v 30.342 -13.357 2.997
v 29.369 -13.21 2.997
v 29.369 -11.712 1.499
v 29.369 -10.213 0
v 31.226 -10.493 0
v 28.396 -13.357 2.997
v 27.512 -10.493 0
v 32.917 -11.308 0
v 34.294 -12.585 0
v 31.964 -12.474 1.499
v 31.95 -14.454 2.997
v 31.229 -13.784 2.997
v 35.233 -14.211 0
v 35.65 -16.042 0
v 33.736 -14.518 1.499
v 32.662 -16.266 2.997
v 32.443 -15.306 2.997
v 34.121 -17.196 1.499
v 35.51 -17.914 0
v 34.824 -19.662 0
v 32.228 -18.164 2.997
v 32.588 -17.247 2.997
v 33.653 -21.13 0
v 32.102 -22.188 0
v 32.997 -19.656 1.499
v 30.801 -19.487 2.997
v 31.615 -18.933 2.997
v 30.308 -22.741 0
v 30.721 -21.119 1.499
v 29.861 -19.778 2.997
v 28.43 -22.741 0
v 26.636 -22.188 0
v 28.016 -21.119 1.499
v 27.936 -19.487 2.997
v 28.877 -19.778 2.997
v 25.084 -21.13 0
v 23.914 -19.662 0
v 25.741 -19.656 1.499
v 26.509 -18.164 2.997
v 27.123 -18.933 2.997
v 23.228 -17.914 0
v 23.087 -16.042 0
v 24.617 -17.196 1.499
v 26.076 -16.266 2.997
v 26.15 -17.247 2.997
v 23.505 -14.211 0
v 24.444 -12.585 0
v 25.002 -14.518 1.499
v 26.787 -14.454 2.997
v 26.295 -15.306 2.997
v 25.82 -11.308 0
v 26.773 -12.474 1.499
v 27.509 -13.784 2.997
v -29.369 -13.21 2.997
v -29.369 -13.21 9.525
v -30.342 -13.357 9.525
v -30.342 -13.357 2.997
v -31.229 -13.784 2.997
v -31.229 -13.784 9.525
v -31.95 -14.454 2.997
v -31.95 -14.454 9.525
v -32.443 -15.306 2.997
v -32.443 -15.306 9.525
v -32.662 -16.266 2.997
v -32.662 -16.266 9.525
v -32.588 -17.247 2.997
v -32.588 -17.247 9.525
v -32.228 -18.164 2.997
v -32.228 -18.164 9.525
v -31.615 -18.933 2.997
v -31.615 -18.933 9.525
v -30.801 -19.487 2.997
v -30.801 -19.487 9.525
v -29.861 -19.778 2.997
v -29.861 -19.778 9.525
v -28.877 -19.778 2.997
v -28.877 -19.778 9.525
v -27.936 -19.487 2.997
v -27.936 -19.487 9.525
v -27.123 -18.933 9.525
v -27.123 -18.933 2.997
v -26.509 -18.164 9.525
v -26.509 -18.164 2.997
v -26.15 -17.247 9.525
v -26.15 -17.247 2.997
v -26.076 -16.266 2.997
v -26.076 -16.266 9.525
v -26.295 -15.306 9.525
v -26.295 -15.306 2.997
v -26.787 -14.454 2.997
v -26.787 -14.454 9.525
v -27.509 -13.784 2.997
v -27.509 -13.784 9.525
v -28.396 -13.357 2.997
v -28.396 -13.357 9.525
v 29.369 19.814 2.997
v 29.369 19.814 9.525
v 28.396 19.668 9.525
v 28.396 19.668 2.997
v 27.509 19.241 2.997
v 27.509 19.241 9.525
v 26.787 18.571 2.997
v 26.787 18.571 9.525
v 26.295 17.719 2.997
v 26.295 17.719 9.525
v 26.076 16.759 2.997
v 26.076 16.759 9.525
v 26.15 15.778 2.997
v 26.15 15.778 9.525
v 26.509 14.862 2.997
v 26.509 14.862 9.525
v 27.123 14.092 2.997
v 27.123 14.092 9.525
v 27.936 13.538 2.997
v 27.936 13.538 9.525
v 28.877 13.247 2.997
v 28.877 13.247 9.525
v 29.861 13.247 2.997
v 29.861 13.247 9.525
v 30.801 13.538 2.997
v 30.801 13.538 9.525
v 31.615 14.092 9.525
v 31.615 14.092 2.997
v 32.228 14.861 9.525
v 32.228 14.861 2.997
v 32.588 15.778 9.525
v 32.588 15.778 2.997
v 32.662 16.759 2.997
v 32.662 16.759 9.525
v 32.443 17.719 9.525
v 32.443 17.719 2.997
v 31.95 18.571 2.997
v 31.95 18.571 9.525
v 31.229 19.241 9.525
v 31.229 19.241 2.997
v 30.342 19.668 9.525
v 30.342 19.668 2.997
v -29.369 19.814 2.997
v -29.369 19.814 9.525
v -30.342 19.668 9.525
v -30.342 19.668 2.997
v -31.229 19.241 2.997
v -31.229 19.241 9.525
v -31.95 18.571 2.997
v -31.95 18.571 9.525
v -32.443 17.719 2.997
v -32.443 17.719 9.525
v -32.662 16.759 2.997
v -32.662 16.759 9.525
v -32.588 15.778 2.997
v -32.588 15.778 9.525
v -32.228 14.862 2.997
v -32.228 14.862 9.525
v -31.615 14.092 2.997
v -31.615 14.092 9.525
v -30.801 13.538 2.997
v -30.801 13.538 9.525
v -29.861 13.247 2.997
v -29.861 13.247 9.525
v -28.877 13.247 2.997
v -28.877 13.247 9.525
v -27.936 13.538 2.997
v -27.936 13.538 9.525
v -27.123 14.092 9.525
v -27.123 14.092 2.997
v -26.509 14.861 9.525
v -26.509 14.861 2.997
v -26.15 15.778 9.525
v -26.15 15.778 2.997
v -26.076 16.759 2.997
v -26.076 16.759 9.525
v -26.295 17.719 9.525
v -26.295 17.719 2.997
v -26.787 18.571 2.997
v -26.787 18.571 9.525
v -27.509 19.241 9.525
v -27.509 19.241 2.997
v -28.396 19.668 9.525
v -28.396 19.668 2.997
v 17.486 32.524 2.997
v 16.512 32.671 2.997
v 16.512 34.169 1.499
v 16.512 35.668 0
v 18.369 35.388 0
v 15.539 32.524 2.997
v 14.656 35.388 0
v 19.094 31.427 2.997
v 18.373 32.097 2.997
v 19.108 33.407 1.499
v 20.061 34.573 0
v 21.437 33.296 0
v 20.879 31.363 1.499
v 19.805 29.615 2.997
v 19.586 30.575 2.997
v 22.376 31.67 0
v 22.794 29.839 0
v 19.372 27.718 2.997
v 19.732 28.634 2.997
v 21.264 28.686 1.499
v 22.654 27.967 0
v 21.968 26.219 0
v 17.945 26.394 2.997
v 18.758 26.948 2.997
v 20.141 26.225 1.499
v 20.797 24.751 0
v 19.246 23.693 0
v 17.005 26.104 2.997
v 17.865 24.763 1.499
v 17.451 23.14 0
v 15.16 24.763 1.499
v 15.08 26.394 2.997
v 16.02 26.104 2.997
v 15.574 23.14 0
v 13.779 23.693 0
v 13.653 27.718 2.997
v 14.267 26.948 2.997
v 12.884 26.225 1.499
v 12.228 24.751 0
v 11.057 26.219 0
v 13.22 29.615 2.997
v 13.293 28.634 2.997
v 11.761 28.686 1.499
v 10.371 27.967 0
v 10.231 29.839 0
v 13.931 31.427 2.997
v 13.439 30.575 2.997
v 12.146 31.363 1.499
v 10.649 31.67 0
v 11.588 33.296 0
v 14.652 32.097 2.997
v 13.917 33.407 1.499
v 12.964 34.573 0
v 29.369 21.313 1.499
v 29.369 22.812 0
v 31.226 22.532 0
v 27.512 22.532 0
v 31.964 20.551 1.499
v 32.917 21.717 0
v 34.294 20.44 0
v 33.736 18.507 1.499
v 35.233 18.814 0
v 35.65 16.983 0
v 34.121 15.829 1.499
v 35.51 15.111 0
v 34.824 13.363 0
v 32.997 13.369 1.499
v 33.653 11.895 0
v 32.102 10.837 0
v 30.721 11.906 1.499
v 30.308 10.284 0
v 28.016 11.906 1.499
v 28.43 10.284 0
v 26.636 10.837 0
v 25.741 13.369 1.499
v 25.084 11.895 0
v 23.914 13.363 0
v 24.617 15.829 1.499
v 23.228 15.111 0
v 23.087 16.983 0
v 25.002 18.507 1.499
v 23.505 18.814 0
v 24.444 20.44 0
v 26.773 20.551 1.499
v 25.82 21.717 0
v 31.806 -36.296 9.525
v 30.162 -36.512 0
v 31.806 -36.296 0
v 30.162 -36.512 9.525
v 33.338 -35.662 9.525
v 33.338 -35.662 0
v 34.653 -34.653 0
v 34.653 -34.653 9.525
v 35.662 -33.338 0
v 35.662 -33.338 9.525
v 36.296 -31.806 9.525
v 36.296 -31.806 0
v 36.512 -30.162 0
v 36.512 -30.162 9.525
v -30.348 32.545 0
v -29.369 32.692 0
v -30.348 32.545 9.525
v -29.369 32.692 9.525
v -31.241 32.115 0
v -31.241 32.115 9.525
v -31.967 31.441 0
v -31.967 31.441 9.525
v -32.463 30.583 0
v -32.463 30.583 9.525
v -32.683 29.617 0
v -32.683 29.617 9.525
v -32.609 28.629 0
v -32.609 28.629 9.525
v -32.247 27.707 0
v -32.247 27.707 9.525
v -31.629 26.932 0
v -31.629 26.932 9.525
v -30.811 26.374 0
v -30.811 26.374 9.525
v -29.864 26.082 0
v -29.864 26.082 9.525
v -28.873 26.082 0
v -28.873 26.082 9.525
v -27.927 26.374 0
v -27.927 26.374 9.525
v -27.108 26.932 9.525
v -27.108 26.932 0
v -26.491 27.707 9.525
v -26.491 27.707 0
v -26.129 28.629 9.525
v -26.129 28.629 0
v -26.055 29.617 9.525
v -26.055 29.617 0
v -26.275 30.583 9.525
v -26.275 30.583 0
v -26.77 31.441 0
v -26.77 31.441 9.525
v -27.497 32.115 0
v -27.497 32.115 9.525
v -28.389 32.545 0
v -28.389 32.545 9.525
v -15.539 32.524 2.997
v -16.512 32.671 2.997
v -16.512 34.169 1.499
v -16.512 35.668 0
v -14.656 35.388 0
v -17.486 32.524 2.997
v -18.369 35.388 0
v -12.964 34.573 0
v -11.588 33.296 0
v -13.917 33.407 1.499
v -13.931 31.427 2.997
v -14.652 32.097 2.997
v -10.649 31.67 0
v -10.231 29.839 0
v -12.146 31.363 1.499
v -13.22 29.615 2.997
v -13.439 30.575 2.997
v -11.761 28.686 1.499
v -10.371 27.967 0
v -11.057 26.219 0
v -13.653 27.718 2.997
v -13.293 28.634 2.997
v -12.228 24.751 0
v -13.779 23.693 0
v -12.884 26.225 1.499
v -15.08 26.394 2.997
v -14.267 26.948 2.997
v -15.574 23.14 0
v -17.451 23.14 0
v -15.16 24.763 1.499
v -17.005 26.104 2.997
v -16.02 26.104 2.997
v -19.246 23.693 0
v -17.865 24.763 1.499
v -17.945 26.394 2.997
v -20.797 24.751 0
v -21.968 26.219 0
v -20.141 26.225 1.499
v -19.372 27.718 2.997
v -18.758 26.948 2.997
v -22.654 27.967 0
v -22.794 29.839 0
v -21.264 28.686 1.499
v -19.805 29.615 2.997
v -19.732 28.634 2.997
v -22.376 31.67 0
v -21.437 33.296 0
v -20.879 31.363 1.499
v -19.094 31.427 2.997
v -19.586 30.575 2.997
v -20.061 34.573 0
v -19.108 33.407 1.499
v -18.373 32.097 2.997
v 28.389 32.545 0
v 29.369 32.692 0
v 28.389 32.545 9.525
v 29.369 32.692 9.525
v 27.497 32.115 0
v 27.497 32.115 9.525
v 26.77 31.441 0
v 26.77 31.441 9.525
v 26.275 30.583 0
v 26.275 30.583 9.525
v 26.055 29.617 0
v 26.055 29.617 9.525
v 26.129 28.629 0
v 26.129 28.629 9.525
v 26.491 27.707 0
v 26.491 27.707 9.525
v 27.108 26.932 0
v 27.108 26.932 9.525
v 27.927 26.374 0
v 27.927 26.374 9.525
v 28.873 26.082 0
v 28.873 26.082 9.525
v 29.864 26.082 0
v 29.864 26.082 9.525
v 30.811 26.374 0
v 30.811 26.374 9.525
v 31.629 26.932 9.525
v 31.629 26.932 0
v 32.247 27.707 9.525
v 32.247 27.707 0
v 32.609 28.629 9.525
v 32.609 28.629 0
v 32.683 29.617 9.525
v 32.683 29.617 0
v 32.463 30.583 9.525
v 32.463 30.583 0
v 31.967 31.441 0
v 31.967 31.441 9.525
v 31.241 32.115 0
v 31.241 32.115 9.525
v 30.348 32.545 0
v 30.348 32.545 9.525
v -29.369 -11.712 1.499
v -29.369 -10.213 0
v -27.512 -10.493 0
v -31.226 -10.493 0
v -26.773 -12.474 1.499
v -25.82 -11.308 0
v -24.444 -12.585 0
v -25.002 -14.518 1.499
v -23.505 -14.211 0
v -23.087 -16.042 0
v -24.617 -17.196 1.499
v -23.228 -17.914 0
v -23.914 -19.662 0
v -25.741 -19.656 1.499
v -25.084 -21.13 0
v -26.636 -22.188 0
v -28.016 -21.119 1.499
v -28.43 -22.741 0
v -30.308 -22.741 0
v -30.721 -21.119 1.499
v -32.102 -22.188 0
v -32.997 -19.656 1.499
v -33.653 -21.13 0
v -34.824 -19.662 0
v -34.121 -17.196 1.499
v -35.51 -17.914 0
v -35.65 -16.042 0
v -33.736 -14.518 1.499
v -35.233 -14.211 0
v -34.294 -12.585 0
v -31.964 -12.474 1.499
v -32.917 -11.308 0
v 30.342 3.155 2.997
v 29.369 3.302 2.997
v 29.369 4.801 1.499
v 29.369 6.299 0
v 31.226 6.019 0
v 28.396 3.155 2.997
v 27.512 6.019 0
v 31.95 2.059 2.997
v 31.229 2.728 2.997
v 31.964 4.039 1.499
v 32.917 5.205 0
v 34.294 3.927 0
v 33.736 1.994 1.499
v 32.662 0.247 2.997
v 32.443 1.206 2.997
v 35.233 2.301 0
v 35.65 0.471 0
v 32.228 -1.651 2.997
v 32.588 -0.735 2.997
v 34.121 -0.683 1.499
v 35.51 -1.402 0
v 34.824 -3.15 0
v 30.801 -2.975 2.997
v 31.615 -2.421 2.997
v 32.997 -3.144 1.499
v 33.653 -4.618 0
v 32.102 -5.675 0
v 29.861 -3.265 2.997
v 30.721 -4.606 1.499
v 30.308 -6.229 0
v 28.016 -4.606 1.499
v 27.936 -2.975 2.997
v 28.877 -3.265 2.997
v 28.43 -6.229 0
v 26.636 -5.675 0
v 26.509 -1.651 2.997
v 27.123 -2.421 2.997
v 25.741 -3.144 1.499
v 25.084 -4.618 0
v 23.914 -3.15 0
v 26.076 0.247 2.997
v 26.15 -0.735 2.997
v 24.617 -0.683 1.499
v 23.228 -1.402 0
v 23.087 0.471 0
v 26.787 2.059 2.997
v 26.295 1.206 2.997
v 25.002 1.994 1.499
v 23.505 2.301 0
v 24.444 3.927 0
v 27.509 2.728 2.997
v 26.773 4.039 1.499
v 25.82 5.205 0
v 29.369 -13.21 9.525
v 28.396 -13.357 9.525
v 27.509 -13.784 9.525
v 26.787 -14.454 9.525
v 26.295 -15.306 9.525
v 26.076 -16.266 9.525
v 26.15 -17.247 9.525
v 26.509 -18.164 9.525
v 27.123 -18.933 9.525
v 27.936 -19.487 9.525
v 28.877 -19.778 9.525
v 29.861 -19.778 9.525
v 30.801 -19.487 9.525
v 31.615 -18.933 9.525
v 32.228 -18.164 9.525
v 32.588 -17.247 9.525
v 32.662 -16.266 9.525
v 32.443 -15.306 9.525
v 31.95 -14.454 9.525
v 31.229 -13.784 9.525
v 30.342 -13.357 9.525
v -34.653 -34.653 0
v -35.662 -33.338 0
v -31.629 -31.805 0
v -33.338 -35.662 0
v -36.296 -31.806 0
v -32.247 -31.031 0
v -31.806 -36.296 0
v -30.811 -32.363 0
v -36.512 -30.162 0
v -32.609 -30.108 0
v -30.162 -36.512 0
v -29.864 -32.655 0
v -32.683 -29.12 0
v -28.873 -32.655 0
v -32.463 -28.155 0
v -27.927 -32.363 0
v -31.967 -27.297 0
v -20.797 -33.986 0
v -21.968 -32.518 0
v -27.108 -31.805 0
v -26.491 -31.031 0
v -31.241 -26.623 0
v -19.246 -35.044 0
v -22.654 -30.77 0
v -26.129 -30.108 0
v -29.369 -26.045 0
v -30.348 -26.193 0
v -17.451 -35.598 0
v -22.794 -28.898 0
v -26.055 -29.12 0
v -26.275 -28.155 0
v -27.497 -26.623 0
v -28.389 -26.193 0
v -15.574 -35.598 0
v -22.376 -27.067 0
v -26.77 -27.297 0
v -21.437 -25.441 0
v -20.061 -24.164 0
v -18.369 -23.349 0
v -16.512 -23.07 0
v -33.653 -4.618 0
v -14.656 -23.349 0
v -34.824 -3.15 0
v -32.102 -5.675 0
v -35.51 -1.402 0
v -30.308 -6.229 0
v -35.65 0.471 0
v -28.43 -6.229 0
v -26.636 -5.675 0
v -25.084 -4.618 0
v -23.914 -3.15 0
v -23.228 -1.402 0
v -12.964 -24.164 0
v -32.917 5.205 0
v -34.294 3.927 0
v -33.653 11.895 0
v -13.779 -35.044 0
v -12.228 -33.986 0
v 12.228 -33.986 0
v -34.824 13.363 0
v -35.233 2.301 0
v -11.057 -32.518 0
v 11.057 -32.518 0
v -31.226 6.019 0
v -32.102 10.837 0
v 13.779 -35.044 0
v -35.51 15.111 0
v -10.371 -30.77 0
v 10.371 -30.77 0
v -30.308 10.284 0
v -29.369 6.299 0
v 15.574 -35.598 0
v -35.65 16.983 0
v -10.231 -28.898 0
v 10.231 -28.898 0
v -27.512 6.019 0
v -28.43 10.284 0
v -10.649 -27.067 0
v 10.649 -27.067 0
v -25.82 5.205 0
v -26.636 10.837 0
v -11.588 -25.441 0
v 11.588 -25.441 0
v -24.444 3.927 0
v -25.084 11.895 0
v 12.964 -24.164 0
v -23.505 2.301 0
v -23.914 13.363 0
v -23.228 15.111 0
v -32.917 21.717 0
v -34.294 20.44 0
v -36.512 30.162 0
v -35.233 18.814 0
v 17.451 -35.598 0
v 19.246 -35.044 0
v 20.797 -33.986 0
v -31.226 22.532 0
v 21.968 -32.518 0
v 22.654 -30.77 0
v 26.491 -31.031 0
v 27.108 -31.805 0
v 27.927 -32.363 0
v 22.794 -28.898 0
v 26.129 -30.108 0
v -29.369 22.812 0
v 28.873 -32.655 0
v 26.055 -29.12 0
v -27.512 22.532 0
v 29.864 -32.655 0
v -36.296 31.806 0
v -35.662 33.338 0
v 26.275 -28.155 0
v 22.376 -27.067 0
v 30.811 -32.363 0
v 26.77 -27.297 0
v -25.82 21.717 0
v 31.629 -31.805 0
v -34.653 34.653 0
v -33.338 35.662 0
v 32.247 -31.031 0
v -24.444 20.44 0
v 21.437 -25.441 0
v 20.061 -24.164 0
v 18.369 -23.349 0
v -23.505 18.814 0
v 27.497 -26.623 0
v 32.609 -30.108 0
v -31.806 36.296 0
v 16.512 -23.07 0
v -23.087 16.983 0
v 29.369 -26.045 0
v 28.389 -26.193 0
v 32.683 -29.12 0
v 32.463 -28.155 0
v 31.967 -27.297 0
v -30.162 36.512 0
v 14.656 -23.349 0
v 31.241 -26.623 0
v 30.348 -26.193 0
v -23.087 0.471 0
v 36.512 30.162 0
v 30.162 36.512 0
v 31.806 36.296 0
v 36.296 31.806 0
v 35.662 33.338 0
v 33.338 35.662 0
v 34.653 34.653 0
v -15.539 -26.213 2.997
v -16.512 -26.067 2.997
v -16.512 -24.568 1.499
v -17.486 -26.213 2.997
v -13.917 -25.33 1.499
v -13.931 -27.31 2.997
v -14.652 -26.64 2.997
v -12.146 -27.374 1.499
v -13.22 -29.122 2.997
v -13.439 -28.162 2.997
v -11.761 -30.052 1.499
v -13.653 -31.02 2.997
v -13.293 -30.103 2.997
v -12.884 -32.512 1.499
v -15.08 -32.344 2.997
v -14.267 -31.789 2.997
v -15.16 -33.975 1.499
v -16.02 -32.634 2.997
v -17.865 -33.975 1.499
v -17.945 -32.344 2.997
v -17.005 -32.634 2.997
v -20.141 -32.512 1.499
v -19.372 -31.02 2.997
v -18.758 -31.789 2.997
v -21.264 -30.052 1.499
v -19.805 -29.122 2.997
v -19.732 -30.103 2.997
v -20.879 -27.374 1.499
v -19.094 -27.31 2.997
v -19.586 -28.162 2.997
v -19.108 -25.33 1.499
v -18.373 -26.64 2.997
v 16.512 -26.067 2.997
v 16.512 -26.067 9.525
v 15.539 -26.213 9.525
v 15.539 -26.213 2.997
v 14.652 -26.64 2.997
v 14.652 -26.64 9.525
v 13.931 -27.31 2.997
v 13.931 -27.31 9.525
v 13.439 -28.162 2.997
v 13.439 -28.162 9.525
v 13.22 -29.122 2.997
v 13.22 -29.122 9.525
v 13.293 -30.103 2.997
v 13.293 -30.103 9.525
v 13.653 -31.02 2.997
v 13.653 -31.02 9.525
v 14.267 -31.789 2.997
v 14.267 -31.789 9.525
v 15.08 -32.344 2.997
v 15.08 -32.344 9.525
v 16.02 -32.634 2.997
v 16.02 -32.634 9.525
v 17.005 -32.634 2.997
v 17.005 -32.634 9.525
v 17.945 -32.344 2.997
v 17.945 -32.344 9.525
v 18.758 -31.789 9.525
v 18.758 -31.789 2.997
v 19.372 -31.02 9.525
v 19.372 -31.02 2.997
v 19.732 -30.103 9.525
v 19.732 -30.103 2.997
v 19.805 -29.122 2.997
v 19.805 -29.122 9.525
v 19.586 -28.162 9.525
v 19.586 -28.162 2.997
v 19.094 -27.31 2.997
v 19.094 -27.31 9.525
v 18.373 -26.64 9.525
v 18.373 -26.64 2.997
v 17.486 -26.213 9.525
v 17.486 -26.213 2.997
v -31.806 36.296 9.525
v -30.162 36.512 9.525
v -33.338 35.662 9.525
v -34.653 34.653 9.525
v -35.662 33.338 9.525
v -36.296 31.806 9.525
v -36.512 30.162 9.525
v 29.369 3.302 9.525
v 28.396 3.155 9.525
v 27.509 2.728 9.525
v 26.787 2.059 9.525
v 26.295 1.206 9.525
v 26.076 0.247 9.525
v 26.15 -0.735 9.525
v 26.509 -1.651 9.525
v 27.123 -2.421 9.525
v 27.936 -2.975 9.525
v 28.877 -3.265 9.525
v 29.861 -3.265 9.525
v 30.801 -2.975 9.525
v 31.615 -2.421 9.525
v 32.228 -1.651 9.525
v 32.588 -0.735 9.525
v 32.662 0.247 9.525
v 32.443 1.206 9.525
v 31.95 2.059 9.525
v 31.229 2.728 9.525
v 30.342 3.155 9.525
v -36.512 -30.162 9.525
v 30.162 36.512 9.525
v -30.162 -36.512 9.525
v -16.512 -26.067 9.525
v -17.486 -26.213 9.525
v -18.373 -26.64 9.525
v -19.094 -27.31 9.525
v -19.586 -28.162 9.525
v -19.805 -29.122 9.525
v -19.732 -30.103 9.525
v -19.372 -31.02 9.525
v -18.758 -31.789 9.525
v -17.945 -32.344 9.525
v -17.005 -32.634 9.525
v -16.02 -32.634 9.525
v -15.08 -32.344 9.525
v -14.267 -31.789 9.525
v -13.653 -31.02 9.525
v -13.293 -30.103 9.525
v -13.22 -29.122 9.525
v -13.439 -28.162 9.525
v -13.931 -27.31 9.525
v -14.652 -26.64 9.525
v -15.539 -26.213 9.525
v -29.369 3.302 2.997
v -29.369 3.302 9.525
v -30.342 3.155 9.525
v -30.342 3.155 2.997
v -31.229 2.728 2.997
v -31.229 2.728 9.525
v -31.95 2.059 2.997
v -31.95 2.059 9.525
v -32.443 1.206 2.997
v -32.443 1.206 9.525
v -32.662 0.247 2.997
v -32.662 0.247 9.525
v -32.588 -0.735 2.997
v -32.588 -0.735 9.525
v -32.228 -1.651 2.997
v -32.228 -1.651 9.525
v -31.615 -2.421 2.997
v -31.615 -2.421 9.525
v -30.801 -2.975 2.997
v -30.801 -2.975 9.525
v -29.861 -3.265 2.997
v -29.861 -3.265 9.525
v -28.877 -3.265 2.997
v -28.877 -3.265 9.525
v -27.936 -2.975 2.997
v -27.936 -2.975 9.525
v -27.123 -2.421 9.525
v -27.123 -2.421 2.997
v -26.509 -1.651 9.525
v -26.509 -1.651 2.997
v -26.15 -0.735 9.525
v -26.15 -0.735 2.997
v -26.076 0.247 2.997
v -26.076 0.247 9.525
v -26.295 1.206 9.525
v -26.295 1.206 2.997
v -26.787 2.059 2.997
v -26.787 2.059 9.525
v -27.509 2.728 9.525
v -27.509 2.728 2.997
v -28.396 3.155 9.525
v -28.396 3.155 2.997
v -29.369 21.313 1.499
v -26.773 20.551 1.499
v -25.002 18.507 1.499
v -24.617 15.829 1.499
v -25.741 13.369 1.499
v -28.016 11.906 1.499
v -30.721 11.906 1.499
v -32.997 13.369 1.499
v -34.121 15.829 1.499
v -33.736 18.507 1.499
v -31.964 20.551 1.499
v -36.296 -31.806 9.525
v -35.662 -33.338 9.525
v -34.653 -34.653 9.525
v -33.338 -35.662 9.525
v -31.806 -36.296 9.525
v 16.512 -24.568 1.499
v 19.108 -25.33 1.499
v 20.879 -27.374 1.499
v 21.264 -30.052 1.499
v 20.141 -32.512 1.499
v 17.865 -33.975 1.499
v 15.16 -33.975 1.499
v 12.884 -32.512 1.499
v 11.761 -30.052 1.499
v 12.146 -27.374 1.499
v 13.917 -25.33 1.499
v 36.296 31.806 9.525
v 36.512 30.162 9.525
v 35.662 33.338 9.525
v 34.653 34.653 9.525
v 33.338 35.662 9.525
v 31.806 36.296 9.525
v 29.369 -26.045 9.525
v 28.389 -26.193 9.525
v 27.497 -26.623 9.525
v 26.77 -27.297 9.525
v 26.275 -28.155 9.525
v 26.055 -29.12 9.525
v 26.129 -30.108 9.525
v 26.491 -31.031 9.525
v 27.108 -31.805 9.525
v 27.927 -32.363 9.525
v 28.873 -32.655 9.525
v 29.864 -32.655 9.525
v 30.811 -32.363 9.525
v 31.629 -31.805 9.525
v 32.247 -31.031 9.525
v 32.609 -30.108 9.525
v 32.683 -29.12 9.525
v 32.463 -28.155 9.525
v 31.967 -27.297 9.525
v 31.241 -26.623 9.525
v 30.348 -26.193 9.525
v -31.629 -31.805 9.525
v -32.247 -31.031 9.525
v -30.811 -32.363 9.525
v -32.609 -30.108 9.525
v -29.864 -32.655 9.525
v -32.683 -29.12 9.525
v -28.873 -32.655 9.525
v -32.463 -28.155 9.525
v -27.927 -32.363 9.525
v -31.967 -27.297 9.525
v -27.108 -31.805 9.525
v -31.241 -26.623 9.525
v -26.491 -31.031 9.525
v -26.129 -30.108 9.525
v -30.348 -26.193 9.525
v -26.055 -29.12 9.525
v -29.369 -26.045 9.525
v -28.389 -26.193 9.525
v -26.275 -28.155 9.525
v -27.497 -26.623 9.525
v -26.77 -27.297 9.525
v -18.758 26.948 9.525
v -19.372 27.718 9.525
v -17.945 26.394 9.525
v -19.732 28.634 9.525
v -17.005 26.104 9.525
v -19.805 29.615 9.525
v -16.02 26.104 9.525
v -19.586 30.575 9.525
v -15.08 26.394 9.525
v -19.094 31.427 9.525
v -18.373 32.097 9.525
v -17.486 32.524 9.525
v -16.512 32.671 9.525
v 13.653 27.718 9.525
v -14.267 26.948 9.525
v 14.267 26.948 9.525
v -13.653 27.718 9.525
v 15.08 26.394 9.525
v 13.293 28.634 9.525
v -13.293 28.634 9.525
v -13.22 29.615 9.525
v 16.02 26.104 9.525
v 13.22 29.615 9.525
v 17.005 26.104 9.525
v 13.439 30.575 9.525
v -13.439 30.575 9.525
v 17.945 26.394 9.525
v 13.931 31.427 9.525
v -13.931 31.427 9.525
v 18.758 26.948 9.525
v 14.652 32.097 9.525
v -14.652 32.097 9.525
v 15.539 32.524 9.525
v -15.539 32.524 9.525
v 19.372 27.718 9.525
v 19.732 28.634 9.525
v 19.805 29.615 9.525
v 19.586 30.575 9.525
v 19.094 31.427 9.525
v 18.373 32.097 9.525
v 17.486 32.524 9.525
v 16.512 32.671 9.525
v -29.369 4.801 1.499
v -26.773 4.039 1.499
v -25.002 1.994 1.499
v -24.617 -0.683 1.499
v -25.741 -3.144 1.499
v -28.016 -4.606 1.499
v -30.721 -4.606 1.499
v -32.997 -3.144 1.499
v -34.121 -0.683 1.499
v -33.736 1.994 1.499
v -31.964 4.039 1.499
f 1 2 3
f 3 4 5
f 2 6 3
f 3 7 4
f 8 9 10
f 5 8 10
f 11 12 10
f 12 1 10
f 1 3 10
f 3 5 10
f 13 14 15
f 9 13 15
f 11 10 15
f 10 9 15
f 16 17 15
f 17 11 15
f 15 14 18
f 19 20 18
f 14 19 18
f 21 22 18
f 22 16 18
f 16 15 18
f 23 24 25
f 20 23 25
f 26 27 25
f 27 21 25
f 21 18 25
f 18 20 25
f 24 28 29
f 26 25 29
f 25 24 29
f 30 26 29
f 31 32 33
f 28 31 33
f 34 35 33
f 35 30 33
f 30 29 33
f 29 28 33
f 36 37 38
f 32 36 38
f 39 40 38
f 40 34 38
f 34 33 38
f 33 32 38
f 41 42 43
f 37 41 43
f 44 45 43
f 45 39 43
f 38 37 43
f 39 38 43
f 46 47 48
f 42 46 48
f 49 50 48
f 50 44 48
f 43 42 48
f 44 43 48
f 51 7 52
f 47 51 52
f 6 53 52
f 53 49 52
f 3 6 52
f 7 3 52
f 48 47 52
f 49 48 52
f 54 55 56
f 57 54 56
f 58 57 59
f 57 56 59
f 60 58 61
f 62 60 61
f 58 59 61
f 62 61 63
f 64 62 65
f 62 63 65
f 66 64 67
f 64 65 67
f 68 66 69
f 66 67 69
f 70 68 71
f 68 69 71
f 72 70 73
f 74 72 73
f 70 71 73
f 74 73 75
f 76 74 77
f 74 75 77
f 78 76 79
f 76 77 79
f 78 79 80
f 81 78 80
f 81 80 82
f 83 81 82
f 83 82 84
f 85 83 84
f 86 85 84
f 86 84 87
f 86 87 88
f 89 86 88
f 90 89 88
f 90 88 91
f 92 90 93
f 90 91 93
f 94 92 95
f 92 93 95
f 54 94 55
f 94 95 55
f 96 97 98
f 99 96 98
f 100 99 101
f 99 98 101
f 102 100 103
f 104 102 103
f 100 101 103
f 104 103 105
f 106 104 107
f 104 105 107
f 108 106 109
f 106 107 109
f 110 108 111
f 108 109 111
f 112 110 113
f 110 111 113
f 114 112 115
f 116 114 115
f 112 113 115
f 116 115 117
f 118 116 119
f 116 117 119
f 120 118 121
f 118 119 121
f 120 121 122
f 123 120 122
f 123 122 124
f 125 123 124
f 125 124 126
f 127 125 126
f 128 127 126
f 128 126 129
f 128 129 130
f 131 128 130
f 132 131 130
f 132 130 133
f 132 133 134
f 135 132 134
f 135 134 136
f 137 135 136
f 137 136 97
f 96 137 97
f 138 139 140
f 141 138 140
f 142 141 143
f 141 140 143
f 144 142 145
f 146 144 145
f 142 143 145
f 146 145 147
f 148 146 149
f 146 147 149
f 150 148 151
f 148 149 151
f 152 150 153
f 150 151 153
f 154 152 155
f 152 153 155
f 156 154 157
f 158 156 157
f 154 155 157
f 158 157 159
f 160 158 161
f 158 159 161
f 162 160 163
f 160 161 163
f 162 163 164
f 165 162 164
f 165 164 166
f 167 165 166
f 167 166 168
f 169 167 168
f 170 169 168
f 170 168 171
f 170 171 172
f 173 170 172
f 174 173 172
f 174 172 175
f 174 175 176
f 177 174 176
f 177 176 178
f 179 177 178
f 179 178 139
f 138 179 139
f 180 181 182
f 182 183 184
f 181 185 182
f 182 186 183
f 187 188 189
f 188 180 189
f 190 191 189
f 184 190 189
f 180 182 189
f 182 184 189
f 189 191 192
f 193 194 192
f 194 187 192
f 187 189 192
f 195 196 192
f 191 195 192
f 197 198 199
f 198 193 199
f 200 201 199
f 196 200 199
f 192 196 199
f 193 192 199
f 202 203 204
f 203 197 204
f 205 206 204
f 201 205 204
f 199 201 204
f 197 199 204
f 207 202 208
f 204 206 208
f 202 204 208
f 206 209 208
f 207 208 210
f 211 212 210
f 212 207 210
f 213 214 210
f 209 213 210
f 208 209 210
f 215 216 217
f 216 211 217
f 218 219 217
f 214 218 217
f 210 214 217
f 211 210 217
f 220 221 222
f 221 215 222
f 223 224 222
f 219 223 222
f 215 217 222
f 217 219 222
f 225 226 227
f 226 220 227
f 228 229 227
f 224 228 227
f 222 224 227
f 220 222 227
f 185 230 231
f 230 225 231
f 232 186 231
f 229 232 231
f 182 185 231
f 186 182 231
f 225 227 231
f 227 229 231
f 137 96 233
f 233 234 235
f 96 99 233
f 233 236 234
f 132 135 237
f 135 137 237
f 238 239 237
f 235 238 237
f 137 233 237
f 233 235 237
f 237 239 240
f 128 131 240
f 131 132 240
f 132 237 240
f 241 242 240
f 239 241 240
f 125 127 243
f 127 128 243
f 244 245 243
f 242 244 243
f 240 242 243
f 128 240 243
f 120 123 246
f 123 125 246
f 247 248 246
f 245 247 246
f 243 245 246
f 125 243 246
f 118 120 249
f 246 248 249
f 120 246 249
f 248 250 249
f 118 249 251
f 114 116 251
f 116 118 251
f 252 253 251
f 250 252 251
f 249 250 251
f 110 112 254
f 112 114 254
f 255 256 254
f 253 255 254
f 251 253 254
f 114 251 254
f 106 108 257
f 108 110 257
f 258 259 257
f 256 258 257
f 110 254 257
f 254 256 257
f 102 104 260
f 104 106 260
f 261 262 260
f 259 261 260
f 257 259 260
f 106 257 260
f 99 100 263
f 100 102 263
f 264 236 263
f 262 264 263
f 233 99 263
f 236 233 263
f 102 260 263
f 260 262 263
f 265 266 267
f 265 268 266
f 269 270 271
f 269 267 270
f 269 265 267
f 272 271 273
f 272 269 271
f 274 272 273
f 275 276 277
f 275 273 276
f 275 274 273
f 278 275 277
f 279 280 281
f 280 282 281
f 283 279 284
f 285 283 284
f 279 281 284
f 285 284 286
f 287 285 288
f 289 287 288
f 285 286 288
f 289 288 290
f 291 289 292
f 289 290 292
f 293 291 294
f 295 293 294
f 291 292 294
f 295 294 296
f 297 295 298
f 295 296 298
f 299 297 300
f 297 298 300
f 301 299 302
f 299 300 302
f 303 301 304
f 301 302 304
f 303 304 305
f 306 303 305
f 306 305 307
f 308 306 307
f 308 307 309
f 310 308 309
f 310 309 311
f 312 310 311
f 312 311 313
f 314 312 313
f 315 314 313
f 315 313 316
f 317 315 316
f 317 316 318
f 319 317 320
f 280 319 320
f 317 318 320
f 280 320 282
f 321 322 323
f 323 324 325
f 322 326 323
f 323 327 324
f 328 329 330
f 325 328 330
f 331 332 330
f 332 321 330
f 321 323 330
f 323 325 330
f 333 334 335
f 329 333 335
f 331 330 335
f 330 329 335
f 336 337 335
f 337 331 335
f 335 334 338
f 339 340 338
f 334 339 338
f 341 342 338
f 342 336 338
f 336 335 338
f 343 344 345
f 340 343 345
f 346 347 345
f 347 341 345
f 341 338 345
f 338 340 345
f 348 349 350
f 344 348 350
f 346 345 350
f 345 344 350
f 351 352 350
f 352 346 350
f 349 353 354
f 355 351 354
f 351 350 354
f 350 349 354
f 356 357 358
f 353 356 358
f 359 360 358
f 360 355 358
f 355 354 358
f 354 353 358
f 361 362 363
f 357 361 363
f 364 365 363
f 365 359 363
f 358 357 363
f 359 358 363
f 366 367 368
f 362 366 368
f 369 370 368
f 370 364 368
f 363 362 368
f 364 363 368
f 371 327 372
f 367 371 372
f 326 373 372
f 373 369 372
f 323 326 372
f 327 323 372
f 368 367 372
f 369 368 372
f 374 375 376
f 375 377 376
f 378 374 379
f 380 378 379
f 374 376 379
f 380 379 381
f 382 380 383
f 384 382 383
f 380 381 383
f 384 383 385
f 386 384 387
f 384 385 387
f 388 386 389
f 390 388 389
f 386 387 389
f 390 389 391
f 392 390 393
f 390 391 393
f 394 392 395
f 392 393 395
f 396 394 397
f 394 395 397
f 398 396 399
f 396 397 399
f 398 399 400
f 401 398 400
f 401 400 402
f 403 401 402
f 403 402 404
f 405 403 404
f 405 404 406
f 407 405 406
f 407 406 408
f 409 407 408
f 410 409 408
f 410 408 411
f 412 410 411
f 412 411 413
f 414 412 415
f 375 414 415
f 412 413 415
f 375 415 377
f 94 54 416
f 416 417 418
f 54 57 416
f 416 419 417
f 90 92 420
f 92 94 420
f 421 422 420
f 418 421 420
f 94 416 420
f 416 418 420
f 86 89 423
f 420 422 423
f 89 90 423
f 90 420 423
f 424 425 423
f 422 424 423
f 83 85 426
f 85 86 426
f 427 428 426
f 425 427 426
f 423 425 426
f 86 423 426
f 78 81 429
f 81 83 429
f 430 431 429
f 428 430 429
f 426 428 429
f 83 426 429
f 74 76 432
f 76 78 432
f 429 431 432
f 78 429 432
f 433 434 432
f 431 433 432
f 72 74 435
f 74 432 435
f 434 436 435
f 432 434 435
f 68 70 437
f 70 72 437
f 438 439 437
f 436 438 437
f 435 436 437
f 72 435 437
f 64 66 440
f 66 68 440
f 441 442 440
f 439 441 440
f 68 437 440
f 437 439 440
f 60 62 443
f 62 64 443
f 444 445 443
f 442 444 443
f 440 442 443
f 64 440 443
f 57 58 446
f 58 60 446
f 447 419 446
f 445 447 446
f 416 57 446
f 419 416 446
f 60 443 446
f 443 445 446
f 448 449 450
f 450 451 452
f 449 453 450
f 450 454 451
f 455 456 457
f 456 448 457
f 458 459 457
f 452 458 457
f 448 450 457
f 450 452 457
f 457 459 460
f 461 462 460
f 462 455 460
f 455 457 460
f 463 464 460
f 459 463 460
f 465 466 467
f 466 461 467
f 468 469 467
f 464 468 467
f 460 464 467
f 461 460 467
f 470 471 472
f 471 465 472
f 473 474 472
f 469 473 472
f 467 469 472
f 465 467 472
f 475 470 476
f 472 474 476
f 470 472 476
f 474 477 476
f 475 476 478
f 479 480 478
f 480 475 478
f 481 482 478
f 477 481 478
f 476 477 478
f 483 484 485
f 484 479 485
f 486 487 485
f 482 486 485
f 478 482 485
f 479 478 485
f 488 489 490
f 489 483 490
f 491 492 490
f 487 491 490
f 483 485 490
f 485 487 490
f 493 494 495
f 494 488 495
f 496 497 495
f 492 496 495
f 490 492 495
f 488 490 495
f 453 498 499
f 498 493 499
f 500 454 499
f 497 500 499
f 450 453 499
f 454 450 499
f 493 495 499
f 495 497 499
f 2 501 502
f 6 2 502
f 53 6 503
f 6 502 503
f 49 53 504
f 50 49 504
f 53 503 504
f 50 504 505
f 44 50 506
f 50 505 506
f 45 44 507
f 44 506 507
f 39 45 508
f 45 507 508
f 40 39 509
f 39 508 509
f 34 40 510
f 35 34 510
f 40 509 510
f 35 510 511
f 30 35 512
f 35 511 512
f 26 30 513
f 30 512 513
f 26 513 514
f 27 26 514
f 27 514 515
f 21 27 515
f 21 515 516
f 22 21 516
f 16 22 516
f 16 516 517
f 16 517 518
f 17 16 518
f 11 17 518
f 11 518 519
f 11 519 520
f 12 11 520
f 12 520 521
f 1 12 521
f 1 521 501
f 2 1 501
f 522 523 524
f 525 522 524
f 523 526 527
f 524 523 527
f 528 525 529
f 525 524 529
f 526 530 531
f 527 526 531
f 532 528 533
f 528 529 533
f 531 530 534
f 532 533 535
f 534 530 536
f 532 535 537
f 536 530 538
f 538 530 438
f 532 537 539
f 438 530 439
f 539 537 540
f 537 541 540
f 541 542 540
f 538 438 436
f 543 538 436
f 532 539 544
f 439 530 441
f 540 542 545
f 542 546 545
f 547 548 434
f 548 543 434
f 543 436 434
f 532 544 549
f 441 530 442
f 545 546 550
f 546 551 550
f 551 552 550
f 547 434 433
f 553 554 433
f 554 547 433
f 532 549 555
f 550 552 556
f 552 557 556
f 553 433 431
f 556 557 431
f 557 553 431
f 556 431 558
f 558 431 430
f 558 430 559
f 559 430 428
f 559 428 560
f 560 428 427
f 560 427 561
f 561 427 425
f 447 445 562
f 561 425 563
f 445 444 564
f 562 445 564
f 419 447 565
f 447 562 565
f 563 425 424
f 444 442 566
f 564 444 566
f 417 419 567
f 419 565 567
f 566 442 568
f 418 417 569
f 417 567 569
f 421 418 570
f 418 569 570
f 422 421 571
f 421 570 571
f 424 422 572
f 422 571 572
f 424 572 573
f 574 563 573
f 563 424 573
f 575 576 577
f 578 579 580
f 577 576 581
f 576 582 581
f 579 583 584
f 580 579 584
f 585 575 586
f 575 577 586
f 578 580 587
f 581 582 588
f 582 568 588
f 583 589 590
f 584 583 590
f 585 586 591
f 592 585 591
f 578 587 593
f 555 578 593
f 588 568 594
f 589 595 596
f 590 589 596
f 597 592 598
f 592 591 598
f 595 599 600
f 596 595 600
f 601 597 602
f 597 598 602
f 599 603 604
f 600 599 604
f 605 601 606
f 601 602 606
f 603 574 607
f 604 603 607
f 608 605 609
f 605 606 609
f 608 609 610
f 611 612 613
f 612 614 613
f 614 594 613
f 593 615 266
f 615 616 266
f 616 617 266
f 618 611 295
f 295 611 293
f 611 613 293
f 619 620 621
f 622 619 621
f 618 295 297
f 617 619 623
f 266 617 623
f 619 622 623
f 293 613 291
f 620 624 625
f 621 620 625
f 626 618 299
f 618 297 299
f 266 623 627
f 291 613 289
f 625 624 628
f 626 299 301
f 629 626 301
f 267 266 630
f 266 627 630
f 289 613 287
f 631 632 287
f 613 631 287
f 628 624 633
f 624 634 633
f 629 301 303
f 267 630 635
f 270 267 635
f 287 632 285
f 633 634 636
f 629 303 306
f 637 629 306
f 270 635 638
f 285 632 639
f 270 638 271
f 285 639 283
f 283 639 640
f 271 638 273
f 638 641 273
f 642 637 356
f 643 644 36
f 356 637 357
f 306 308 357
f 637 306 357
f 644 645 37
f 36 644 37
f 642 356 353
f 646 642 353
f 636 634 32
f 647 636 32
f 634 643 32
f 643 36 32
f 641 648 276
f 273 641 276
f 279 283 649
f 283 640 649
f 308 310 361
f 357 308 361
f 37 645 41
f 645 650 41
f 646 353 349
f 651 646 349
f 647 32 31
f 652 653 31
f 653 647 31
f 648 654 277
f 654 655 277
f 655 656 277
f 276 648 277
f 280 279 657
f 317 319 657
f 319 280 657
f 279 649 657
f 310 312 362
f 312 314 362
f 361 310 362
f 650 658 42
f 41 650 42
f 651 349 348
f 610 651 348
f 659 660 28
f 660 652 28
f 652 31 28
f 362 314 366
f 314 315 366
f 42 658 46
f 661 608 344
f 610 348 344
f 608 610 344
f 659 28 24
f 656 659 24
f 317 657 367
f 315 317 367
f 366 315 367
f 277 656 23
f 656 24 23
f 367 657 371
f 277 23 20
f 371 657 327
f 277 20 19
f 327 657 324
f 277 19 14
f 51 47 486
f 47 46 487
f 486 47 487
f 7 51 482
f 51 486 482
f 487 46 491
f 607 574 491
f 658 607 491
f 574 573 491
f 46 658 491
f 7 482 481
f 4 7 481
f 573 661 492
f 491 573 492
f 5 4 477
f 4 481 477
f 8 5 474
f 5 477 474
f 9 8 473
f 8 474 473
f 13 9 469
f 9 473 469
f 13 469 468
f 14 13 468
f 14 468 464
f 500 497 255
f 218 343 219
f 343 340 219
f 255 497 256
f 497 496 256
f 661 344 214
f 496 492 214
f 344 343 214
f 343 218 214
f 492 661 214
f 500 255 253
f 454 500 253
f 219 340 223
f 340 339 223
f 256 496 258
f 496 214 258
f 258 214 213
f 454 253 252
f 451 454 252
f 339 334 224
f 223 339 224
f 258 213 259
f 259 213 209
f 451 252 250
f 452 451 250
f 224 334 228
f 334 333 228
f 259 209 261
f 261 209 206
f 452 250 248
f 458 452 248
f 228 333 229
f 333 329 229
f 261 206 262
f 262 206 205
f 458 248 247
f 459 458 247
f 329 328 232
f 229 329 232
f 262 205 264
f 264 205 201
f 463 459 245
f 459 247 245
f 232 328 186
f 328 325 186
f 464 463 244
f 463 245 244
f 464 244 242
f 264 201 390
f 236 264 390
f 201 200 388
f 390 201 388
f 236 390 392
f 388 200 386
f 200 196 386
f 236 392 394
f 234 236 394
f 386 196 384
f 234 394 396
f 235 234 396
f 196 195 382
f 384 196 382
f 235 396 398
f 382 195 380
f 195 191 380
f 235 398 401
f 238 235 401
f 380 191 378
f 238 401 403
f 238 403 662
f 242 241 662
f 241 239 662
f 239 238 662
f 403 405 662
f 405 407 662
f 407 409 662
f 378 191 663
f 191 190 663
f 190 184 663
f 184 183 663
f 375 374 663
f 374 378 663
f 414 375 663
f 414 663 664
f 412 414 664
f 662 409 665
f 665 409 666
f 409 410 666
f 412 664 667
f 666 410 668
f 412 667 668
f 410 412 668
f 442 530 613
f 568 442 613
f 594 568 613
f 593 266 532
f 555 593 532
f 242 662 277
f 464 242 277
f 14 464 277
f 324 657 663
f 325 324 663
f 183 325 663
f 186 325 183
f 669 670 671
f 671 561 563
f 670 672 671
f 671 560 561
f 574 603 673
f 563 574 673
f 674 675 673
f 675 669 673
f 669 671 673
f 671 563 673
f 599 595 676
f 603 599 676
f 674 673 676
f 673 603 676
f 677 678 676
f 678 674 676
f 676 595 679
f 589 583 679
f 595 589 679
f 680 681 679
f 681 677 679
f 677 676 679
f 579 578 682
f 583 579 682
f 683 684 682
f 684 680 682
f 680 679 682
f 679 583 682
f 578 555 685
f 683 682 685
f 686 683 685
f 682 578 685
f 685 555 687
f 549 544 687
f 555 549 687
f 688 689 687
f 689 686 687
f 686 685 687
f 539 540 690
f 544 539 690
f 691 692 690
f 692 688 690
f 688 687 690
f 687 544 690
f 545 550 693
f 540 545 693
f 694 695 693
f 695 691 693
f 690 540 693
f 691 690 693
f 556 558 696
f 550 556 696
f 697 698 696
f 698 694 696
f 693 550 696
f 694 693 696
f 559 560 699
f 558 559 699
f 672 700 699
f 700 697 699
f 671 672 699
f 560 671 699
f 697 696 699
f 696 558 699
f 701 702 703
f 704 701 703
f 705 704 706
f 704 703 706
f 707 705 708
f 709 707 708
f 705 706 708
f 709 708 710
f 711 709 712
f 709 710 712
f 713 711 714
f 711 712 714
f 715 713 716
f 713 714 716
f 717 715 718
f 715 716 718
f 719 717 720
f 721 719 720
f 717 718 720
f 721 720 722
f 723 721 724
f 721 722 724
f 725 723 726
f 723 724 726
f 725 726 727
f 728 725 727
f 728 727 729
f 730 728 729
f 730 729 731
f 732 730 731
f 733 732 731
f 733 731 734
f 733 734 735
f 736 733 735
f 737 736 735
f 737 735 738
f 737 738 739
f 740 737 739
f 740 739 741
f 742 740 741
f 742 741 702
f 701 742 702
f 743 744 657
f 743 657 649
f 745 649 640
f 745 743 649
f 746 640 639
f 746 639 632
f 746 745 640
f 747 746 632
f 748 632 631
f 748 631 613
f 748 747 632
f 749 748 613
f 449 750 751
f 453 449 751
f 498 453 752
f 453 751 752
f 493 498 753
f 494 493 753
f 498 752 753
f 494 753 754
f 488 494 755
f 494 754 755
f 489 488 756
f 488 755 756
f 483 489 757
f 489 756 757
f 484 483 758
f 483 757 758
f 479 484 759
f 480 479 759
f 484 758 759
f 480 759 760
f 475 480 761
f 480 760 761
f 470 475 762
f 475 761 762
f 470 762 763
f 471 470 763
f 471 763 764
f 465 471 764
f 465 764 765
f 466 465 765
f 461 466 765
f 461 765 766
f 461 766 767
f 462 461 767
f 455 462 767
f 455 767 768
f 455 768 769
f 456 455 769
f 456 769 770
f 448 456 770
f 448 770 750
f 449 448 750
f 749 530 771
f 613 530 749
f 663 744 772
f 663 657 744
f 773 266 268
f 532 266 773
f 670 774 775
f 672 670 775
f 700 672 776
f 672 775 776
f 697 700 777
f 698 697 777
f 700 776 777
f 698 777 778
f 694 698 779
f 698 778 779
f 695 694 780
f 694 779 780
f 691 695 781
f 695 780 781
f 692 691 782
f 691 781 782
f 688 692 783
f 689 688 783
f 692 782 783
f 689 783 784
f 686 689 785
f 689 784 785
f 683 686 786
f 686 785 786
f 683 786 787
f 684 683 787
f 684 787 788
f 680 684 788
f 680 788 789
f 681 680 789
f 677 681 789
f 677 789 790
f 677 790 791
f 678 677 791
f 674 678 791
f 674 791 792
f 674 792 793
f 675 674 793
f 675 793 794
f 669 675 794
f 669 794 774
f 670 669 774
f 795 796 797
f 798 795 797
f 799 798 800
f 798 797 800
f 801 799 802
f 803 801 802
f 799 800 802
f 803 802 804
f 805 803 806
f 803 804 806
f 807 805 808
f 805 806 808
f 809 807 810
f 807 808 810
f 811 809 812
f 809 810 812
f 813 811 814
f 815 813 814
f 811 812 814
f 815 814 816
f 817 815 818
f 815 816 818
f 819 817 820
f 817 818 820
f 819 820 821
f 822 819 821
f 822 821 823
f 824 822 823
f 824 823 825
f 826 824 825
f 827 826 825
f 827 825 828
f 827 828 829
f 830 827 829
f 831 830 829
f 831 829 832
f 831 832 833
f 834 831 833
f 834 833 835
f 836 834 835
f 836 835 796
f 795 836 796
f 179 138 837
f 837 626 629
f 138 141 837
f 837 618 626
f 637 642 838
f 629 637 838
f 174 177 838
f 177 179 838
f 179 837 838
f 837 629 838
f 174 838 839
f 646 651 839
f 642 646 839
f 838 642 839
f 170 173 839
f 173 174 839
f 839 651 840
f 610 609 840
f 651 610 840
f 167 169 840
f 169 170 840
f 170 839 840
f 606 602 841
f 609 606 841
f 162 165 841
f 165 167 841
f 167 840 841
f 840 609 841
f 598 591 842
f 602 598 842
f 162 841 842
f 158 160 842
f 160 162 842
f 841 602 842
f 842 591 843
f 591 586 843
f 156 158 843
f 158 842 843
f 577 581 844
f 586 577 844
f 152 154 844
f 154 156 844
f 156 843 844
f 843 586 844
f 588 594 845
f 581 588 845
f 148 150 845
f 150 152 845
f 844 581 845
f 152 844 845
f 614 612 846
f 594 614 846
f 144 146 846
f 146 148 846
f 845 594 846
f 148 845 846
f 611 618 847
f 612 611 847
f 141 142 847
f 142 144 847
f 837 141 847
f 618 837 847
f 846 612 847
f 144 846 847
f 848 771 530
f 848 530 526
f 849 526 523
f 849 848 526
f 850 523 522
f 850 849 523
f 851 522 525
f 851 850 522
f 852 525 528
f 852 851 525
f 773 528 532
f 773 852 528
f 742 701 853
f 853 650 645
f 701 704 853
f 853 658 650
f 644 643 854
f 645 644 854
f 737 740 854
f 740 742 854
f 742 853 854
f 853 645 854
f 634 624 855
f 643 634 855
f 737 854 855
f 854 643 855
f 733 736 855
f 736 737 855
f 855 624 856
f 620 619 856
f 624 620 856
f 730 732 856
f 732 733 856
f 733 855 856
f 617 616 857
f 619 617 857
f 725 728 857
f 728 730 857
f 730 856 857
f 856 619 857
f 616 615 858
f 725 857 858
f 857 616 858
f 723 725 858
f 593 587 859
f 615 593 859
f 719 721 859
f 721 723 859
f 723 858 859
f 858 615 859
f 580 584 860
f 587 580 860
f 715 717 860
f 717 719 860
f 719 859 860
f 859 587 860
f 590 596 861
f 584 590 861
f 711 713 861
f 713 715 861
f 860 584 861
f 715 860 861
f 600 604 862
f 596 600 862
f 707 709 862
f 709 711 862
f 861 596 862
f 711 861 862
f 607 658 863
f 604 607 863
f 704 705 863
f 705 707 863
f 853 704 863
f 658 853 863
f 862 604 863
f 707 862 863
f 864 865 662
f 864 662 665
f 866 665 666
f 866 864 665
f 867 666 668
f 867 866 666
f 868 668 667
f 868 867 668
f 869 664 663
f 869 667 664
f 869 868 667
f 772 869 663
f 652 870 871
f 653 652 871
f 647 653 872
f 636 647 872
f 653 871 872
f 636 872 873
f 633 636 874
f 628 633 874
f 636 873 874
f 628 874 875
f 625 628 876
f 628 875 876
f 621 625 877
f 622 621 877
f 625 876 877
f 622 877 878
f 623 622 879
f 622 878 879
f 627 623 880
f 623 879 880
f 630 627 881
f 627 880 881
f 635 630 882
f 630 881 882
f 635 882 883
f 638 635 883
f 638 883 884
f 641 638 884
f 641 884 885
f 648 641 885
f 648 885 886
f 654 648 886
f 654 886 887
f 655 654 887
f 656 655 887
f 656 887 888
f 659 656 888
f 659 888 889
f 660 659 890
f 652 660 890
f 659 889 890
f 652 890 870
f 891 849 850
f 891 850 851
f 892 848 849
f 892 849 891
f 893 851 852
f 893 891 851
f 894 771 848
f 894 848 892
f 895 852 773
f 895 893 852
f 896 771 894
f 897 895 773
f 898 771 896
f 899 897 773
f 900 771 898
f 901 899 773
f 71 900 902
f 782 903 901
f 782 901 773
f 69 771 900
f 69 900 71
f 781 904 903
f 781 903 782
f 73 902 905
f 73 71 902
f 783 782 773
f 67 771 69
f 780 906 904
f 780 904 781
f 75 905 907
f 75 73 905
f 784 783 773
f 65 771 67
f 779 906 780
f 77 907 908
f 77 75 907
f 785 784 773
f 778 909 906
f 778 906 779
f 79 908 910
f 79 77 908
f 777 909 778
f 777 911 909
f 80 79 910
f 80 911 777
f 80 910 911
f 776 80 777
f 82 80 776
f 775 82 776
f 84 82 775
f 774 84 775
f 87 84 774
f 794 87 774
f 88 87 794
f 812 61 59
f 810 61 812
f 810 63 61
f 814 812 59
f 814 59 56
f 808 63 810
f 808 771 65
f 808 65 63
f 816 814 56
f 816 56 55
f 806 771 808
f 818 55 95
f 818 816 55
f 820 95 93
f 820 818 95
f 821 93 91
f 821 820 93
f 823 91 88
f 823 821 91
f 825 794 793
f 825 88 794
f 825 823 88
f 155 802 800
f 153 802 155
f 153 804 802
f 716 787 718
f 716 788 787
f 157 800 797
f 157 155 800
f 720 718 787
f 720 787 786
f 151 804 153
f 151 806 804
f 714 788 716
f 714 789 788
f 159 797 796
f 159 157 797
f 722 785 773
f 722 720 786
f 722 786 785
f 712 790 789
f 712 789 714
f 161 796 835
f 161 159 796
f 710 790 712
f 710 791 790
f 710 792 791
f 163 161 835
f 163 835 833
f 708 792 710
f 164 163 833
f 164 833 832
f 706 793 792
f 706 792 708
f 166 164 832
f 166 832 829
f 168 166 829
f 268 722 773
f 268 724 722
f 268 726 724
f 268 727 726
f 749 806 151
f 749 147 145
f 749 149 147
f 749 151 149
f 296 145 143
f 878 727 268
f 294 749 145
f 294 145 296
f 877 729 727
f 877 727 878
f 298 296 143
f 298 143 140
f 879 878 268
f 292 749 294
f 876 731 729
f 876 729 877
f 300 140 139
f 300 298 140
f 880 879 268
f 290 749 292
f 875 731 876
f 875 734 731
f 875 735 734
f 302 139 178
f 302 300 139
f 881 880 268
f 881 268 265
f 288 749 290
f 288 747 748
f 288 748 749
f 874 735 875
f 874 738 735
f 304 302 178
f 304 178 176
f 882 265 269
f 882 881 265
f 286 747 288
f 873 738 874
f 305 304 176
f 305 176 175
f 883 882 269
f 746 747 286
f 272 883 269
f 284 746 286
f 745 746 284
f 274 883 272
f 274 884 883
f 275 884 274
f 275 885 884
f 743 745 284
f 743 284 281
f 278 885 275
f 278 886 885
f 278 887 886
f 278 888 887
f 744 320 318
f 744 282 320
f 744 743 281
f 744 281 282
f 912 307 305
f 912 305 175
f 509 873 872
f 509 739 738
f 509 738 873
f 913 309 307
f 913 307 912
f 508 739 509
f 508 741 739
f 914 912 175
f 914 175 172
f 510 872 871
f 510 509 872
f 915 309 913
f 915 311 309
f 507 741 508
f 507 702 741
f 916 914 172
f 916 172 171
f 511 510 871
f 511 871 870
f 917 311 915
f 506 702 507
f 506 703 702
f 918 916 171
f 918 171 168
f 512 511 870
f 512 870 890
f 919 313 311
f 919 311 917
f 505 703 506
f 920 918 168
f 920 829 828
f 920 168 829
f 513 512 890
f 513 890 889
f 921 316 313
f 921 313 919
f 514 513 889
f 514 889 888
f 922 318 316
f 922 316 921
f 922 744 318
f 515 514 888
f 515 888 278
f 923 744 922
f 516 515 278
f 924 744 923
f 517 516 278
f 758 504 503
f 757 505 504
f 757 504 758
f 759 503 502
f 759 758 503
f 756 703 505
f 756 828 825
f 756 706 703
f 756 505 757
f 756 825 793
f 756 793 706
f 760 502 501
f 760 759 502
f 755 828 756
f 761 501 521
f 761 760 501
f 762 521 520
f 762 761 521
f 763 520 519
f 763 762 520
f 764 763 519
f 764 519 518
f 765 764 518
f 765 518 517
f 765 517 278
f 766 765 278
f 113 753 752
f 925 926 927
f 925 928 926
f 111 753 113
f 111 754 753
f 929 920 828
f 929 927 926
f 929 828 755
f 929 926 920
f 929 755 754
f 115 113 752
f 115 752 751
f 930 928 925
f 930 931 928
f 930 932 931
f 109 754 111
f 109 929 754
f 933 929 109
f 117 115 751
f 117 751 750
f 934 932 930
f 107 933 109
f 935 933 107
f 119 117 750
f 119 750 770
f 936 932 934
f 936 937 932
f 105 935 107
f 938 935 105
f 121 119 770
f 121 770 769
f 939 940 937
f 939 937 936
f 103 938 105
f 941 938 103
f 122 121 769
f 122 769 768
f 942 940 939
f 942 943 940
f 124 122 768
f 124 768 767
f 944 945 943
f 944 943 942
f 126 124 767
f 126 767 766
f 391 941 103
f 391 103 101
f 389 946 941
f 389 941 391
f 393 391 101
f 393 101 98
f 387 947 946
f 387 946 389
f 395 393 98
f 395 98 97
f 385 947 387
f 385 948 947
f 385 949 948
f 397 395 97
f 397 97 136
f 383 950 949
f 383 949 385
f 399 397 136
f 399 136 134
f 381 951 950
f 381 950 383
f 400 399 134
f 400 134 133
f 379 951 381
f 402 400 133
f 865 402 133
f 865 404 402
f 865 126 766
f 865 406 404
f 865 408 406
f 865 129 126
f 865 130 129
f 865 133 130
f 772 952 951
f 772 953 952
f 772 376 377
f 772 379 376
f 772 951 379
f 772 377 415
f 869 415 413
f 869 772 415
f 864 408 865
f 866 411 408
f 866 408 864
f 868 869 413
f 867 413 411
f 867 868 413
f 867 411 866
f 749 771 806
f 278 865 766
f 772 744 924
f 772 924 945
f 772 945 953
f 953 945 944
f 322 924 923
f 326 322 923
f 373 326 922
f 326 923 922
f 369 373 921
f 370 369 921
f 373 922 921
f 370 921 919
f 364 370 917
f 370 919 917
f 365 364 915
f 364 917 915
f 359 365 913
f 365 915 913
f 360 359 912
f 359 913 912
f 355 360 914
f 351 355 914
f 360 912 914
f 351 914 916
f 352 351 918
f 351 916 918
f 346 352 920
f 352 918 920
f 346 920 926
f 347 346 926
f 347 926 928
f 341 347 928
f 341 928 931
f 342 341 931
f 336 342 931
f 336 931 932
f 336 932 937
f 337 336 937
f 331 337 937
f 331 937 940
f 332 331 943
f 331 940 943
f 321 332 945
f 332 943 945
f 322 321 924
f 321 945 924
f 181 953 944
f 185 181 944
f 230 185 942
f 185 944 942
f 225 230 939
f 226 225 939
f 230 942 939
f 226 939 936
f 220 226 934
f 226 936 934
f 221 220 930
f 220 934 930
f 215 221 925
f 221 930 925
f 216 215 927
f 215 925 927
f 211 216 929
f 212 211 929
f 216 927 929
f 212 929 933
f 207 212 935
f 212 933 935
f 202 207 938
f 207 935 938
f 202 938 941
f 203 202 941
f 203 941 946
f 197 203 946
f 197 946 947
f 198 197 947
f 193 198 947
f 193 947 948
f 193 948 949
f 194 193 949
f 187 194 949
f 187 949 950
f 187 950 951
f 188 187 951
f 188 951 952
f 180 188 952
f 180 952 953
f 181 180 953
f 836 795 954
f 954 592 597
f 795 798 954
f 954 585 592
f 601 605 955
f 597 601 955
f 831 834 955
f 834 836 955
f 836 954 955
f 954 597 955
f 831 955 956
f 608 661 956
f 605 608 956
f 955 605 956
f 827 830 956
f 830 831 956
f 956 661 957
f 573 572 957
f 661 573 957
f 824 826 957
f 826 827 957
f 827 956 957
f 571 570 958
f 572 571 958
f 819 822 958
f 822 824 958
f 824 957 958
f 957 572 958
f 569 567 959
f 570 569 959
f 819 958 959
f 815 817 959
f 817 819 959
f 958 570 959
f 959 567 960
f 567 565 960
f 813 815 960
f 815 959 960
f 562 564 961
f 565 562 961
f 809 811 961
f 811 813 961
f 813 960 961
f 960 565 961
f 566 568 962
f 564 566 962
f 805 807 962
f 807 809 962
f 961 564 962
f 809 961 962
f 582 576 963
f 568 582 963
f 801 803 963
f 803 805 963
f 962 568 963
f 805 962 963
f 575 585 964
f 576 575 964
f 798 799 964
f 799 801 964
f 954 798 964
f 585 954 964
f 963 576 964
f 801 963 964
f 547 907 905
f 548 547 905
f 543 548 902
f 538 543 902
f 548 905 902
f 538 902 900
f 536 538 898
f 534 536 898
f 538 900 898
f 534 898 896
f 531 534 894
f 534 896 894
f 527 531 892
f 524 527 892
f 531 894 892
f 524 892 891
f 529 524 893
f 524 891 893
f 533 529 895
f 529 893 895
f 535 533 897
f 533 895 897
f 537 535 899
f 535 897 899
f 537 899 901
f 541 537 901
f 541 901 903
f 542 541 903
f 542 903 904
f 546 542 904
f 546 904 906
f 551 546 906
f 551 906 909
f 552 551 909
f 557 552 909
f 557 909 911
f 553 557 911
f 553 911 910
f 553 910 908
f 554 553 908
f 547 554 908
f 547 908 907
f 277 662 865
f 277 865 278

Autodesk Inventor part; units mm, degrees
ref_plane "YZ Plane" through (0, 0, 0) normal (1, 0, 0) x (0, 1, 0)
ref_plane "XZ Plane" through (0, 0, 0) normal (0, 1, 0) x (-1, 0, 0)
ref_plane "XY Plane" through (0, 0, 0) normal (0, 0, 1) x (1, 0, 0)
sketch "Sketch1" plane through (0, 0, 0) normal (0, 0, 1) x (1, 0, 0)
  line L0 (0, 51.1175) -> (0, -51.1175) projected
  line L1 (-51.1175, 0) -> (51.1175, 0) projected
  line L2 (36.5125, -36.5125) -> (-36.5125, -36.5125)
  line L3 (-36.5125, -36.5125) -> (-36.5125, 36.5125)
  line L4 (-36.5125, 36.5125) -> (36.5125, 36.5125)
  line L5 (36.5125, 36.5125) -> (36.5125, -36.5125)
  line L6 (36.5125, -36.5125) -> (-36.5125, 36.5125) construction
  line L7 (-36.5125, -36.5125) -> (36.5125, 36.5125) construction
  line L8 (29.3688, -29.3688) -> (-29.3688, -29.3688) construction
  line L9 (-29.3688, -29.3688) -> (-29.3688, 29.3687) construction
  line L10 (-29.3688, 29.3687) -> (29.3688, 29.3687) construction
  line L11 (29.3688, 29.3687) -> (29.3688, -29.3688) construction
  line L12 (29.3688, -29.3688) -> (-29.3688, 29.3687) construction
  line L13 (-29.3688, -29.3688) -> (29.3688, 29.3687) construction
  point P0 (0, 0)
  dimension "d0" = 73.025
  dimension "d1" = 58.7375
extrude "Extrusion1" add sketch "Sketch1" along normal blind 9.525
hole "Hole1" at (-29.3688, 29.3687, 0) at (29.3688, 29.3687, 0) at (29.3688, -29.3688, 0) at (-29.3688, -29.3688, 0) direction (0, 0, 1) diameter 6.647 end through all thread size "M8x1.25" class "6H" standard "ANSI Metric M Profile"
sketch "Sketch2" plane through (0, 0, 0) normal (0, 0, -1) x (-1, 0, 0)
  line L0 (-36.5125, 36.5125) -> (36.5125, 36.5125) projected
  line L1 (-29.3688, 29.3687) -> (-29.3688, -29.3688) construction
  line L2 (29.3688, -29.3688) -> (29.3688, 29.3687) construction
  line L3 (29.3688, 29.3687) -> (-29.3688, 29.3687) construction
  line L4 (-29.3688, -29.3688) -> (29.3688, -29.3688) construction
  line L5 (16.5125, -29.3687) -> (-16.5125, -29.3687) construction
  line L6 (-16.5125, -29.3687) -> (-16.5125, 29.3687) construction
  line L7 (-16.5125, 29.3687) -> (16.5125, 29.3687) construction
  line L8 (16.5125, 29.3687) -> (16.5125, -29.3687) construction
  line L9 (16.5125, -29.3687) -> (-16.5125, 29.3687) construction
  line L10 (-16.5125, -29.3687) -> (16.5125, 29.3687) construction
  line L11 (-36.5125, -36.5125) -> (-36.5125, 36.5125) construction
  line L12 (29.3688, -16.5125) -> (-29.3688, -16.5125) construction
  line L13 (-29.3688, -16.5125) -> (-29.3688, 16.5125) construction
  line L14 (-29.3688, 16.5125) -> (29.3688, 16.5125) construction
  line L15 (29.3688, 16.5125) -> (29.3688, -16.5125) construction
  line L16 (29.3688, -16.5125) -> (-29.3688, 16.5125) construction
  line L17 (-29.3688, -16.5125) -> (29.3688, 16.5125) construction
  point P0 (0, 0)
  point P1 (-29.3688, 0)
  point P2 (29.3688, 0)
  point P3 (0, 29.3687)
  point P4 (0, -29.3688)
  dimension "d12" = 20
  dimension "d21" = 20
hole "Hole2" at (-16.5125, 29.3687, 0) at (16.5125, -29.3687, 0) at (29.3688, 0, 0) at (-29.3688, 0, 0) at (16.5125, 29.3687, 0) at (-16.5125, -29.3687, 0) at (29.3688, 16.5125, 0) at (29.3688, -16.5125, 0) at (-29.3688, -16.5125, 0) at (-29.3688, 16.5125, 0) direction (0, 0, 1) diameter 6.604 end through all countersink diameter 12.5984 countersink angle 90 clearance for "Flat Head Machine Screw" size "M6" standard "Ansi Metric M Profile"
fillet "Fillet1" radius 6.35 4 edges at (-36.5125, -36.5125, 4.7625) (-36.5125, 36.5125, 4.7625) (36.5125, -36.5125, 4.7625) (36.5125, 36.5125, 4.7625)
sketch "Sketch3" plane through (0, 0, 9.525) normal (0, 0, 1) x (1, 0, 0)
  point P0 (0, 0)
